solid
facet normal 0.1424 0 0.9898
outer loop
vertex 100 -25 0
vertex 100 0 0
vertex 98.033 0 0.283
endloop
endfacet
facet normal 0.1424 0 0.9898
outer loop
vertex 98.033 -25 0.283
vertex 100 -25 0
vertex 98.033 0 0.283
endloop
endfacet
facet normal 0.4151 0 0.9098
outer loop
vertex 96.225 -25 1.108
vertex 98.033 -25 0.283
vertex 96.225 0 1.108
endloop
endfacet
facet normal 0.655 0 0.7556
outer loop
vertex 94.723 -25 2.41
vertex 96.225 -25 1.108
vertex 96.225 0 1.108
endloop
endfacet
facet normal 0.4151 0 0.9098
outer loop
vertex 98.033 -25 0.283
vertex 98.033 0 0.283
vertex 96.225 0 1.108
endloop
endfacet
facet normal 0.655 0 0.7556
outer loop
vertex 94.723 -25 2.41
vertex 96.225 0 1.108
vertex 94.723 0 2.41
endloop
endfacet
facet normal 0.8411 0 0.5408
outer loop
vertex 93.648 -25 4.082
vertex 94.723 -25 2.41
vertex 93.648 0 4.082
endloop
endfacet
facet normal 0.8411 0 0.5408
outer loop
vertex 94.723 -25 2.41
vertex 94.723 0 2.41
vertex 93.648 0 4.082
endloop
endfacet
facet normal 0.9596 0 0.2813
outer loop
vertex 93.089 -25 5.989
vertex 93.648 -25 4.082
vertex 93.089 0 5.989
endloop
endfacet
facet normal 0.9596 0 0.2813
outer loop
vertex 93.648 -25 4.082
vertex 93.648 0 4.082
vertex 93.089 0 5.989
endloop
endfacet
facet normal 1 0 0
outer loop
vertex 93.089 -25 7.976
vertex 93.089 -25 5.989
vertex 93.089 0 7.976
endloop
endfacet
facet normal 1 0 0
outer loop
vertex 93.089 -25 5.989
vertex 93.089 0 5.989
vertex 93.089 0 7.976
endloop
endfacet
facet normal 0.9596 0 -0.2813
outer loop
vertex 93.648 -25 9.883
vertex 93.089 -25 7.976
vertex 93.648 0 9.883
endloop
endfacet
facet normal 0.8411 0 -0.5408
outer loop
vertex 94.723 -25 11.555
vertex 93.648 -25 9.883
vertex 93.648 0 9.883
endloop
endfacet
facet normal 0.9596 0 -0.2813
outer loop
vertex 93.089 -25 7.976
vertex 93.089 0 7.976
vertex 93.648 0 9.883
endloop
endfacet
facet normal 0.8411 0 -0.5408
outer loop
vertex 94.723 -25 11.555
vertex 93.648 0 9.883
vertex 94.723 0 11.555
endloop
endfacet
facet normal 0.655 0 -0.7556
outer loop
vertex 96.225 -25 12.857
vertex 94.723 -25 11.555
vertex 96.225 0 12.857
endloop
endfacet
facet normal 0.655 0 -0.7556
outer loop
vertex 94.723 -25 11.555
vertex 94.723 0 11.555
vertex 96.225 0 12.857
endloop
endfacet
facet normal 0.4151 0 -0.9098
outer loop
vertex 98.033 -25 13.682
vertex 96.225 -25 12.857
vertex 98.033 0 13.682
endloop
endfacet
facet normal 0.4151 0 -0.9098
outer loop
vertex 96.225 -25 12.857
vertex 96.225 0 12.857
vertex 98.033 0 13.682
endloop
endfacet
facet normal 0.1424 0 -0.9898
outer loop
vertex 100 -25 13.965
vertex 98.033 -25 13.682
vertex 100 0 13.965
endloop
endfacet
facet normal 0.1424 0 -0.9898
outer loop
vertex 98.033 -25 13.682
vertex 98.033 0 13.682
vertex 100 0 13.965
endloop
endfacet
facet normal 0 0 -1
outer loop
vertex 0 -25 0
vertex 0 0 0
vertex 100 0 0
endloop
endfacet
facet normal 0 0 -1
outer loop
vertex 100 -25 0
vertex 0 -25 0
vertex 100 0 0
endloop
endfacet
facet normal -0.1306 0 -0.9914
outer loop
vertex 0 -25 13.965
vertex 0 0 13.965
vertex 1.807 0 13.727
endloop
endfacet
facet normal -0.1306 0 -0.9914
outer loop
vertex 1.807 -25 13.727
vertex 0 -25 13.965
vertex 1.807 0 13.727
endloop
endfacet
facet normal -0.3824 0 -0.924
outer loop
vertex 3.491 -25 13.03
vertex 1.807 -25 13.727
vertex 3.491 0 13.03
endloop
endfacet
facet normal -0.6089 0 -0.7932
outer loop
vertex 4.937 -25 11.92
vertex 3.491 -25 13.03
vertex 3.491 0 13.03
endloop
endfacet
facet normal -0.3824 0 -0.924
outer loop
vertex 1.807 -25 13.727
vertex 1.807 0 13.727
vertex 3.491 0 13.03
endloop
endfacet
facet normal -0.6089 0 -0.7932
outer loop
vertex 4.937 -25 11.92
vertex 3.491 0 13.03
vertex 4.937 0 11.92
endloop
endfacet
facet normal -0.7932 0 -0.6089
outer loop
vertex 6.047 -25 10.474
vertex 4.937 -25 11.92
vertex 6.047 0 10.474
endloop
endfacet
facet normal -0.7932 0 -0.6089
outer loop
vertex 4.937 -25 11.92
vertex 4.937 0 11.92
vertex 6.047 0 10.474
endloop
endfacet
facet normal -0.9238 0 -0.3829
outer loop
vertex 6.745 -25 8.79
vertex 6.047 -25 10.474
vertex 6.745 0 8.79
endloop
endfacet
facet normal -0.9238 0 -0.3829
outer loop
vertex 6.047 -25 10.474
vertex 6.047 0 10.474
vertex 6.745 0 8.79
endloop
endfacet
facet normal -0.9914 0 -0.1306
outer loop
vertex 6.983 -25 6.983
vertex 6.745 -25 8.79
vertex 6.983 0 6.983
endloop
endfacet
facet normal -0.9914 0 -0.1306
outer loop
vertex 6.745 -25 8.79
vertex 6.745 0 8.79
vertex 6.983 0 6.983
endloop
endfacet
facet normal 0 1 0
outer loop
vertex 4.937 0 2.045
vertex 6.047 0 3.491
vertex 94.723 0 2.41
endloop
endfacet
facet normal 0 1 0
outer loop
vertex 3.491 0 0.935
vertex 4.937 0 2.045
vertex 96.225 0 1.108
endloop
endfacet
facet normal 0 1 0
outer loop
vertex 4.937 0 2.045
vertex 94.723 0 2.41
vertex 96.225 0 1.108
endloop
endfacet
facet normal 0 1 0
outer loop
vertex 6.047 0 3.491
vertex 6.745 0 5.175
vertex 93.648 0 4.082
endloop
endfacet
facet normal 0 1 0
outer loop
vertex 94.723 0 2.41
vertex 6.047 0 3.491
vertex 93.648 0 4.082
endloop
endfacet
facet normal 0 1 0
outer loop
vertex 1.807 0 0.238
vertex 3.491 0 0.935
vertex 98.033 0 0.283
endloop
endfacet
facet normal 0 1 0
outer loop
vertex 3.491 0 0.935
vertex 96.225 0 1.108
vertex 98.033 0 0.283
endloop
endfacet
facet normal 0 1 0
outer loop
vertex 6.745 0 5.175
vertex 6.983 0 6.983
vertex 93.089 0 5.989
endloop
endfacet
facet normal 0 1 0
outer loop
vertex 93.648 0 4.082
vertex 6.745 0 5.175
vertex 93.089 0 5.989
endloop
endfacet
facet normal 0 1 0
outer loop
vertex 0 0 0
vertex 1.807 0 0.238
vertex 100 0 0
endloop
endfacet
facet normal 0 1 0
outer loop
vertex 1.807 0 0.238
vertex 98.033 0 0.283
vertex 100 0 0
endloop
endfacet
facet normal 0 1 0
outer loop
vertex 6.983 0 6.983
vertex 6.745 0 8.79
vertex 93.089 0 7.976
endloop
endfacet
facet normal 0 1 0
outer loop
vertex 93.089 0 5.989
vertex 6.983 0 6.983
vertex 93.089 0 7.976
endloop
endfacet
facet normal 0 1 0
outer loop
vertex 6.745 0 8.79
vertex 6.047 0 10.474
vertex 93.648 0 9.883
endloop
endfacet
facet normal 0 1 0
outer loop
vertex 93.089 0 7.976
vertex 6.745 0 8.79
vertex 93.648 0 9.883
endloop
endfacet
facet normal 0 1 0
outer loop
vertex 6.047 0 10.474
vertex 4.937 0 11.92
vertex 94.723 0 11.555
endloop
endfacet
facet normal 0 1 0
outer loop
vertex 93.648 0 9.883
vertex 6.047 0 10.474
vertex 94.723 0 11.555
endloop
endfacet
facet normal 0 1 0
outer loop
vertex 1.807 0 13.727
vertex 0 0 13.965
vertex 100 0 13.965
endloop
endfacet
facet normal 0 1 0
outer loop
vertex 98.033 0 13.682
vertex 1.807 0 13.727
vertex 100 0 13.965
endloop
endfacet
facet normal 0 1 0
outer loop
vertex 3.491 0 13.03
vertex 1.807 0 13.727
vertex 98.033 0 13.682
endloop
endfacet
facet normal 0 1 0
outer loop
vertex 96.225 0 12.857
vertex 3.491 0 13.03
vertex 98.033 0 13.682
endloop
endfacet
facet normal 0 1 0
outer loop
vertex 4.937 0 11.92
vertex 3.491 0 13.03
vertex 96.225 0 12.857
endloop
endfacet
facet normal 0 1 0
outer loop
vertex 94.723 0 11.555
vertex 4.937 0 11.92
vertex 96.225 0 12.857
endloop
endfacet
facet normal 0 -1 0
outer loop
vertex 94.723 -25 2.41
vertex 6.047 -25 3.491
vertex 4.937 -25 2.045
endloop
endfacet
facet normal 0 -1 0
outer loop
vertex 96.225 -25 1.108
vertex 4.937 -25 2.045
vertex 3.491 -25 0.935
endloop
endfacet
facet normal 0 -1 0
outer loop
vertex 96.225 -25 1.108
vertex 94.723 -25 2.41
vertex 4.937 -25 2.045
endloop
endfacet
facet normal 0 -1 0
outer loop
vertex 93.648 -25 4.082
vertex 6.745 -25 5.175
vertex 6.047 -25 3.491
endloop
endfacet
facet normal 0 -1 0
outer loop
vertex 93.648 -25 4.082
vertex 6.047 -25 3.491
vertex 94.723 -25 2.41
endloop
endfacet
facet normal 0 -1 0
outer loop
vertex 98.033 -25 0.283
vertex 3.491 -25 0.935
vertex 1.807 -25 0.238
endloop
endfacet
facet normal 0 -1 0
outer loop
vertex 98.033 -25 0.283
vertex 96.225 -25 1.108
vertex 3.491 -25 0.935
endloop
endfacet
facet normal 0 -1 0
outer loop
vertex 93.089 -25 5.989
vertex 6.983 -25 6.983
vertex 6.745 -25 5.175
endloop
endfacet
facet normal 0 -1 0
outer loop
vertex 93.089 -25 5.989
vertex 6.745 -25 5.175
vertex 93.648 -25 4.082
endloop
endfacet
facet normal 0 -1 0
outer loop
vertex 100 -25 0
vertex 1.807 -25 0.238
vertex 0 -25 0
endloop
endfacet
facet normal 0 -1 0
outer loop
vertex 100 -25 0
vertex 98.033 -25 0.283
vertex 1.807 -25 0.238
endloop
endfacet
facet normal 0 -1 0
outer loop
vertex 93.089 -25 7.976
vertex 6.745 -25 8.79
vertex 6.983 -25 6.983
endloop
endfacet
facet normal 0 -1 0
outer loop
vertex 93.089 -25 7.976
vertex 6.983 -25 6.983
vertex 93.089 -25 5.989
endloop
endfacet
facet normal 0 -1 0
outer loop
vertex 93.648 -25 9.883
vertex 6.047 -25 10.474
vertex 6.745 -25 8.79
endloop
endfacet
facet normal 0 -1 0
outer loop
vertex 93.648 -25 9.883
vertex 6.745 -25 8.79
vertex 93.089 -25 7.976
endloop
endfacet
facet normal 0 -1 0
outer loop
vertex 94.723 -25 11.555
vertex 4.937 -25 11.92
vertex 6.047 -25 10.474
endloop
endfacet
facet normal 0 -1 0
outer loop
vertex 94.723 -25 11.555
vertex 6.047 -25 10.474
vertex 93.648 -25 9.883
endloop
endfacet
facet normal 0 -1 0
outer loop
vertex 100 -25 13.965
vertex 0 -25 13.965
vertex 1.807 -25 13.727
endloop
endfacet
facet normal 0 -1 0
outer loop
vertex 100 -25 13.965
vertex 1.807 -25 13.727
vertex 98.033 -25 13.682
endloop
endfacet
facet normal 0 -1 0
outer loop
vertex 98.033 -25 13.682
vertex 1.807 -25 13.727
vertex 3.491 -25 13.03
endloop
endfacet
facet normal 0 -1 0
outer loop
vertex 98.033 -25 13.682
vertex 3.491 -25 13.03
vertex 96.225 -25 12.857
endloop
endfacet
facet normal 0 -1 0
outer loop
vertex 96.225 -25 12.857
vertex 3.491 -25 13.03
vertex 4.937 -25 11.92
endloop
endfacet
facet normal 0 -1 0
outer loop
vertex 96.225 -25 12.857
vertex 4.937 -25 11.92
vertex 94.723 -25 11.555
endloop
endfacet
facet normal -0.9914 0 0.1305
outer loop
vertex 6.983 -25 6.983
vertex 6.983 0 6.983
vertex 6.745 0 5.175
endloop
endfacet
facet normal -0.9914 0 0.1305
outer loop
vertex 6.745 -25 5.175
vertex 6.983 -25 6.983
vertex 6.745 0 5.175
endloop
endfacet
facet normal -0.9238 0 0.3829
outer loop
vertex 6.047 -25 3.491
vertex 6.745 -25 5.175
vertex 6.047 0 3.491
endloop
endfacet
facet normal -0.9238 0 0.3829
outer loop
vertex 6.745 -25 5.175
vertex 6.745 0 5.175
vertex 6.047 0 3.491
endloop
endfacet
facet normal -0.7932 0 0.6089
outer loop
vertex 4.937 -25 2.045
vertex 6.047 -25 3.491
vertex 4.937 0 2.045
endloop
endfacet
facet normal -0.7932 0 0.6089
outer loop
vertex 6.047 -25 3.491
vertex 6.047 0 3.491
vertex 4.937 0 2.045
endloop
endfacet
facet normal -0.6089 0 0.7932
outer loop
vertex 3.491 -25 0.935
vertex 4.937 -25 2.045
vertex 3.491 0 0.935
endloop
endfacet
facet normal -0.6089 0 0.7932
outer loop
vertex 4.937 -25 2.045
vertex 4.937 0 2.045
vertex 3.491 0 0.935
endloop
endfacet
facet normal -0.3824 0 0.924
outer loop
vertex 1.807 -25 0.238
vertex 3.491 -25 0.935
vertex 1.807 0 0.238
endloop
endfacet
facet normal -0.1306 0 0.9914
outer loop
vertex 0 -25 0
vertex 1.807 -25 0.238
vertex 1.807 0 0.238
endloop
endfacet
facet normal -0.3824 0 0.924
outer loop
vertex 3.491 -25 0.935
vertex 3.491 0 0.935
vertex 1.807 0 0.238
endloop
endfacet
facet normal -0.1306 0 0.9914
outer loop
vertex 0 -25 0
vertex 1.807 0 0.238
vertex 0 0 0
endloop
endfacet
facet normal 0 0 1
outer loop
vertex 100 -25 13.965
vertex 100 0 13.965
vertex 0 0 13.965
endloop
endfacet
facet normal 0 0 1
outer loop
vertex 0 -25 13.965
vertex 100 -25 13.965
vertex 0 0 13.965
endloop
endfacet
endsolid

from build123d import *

# Parameters (mm, degrees)
F1_DEPTH = 25


with BuildPart() as f1:
    # F0 (on Front) → F1 (new body)
    with BuildSketch(Plane.XZ):
        with BuildLine():
            ThreePointArc((6.982545, 6.982545), (4.937405, 2.04514), (0, 0))
            Line((0, 0), (100, 0))
            ThreePointArc((100, 0), (93.017455, 6.982545), (100, 13.965091))
            Line((100, 13.965091), (0, 13.965091))
            ThreePointArc((0, 13.965091), (4.937405, 11.919951), (6.982545, 6.982545))
        make_face()
    extrude(amount=F1_DEPTH)


solid = f1.part
